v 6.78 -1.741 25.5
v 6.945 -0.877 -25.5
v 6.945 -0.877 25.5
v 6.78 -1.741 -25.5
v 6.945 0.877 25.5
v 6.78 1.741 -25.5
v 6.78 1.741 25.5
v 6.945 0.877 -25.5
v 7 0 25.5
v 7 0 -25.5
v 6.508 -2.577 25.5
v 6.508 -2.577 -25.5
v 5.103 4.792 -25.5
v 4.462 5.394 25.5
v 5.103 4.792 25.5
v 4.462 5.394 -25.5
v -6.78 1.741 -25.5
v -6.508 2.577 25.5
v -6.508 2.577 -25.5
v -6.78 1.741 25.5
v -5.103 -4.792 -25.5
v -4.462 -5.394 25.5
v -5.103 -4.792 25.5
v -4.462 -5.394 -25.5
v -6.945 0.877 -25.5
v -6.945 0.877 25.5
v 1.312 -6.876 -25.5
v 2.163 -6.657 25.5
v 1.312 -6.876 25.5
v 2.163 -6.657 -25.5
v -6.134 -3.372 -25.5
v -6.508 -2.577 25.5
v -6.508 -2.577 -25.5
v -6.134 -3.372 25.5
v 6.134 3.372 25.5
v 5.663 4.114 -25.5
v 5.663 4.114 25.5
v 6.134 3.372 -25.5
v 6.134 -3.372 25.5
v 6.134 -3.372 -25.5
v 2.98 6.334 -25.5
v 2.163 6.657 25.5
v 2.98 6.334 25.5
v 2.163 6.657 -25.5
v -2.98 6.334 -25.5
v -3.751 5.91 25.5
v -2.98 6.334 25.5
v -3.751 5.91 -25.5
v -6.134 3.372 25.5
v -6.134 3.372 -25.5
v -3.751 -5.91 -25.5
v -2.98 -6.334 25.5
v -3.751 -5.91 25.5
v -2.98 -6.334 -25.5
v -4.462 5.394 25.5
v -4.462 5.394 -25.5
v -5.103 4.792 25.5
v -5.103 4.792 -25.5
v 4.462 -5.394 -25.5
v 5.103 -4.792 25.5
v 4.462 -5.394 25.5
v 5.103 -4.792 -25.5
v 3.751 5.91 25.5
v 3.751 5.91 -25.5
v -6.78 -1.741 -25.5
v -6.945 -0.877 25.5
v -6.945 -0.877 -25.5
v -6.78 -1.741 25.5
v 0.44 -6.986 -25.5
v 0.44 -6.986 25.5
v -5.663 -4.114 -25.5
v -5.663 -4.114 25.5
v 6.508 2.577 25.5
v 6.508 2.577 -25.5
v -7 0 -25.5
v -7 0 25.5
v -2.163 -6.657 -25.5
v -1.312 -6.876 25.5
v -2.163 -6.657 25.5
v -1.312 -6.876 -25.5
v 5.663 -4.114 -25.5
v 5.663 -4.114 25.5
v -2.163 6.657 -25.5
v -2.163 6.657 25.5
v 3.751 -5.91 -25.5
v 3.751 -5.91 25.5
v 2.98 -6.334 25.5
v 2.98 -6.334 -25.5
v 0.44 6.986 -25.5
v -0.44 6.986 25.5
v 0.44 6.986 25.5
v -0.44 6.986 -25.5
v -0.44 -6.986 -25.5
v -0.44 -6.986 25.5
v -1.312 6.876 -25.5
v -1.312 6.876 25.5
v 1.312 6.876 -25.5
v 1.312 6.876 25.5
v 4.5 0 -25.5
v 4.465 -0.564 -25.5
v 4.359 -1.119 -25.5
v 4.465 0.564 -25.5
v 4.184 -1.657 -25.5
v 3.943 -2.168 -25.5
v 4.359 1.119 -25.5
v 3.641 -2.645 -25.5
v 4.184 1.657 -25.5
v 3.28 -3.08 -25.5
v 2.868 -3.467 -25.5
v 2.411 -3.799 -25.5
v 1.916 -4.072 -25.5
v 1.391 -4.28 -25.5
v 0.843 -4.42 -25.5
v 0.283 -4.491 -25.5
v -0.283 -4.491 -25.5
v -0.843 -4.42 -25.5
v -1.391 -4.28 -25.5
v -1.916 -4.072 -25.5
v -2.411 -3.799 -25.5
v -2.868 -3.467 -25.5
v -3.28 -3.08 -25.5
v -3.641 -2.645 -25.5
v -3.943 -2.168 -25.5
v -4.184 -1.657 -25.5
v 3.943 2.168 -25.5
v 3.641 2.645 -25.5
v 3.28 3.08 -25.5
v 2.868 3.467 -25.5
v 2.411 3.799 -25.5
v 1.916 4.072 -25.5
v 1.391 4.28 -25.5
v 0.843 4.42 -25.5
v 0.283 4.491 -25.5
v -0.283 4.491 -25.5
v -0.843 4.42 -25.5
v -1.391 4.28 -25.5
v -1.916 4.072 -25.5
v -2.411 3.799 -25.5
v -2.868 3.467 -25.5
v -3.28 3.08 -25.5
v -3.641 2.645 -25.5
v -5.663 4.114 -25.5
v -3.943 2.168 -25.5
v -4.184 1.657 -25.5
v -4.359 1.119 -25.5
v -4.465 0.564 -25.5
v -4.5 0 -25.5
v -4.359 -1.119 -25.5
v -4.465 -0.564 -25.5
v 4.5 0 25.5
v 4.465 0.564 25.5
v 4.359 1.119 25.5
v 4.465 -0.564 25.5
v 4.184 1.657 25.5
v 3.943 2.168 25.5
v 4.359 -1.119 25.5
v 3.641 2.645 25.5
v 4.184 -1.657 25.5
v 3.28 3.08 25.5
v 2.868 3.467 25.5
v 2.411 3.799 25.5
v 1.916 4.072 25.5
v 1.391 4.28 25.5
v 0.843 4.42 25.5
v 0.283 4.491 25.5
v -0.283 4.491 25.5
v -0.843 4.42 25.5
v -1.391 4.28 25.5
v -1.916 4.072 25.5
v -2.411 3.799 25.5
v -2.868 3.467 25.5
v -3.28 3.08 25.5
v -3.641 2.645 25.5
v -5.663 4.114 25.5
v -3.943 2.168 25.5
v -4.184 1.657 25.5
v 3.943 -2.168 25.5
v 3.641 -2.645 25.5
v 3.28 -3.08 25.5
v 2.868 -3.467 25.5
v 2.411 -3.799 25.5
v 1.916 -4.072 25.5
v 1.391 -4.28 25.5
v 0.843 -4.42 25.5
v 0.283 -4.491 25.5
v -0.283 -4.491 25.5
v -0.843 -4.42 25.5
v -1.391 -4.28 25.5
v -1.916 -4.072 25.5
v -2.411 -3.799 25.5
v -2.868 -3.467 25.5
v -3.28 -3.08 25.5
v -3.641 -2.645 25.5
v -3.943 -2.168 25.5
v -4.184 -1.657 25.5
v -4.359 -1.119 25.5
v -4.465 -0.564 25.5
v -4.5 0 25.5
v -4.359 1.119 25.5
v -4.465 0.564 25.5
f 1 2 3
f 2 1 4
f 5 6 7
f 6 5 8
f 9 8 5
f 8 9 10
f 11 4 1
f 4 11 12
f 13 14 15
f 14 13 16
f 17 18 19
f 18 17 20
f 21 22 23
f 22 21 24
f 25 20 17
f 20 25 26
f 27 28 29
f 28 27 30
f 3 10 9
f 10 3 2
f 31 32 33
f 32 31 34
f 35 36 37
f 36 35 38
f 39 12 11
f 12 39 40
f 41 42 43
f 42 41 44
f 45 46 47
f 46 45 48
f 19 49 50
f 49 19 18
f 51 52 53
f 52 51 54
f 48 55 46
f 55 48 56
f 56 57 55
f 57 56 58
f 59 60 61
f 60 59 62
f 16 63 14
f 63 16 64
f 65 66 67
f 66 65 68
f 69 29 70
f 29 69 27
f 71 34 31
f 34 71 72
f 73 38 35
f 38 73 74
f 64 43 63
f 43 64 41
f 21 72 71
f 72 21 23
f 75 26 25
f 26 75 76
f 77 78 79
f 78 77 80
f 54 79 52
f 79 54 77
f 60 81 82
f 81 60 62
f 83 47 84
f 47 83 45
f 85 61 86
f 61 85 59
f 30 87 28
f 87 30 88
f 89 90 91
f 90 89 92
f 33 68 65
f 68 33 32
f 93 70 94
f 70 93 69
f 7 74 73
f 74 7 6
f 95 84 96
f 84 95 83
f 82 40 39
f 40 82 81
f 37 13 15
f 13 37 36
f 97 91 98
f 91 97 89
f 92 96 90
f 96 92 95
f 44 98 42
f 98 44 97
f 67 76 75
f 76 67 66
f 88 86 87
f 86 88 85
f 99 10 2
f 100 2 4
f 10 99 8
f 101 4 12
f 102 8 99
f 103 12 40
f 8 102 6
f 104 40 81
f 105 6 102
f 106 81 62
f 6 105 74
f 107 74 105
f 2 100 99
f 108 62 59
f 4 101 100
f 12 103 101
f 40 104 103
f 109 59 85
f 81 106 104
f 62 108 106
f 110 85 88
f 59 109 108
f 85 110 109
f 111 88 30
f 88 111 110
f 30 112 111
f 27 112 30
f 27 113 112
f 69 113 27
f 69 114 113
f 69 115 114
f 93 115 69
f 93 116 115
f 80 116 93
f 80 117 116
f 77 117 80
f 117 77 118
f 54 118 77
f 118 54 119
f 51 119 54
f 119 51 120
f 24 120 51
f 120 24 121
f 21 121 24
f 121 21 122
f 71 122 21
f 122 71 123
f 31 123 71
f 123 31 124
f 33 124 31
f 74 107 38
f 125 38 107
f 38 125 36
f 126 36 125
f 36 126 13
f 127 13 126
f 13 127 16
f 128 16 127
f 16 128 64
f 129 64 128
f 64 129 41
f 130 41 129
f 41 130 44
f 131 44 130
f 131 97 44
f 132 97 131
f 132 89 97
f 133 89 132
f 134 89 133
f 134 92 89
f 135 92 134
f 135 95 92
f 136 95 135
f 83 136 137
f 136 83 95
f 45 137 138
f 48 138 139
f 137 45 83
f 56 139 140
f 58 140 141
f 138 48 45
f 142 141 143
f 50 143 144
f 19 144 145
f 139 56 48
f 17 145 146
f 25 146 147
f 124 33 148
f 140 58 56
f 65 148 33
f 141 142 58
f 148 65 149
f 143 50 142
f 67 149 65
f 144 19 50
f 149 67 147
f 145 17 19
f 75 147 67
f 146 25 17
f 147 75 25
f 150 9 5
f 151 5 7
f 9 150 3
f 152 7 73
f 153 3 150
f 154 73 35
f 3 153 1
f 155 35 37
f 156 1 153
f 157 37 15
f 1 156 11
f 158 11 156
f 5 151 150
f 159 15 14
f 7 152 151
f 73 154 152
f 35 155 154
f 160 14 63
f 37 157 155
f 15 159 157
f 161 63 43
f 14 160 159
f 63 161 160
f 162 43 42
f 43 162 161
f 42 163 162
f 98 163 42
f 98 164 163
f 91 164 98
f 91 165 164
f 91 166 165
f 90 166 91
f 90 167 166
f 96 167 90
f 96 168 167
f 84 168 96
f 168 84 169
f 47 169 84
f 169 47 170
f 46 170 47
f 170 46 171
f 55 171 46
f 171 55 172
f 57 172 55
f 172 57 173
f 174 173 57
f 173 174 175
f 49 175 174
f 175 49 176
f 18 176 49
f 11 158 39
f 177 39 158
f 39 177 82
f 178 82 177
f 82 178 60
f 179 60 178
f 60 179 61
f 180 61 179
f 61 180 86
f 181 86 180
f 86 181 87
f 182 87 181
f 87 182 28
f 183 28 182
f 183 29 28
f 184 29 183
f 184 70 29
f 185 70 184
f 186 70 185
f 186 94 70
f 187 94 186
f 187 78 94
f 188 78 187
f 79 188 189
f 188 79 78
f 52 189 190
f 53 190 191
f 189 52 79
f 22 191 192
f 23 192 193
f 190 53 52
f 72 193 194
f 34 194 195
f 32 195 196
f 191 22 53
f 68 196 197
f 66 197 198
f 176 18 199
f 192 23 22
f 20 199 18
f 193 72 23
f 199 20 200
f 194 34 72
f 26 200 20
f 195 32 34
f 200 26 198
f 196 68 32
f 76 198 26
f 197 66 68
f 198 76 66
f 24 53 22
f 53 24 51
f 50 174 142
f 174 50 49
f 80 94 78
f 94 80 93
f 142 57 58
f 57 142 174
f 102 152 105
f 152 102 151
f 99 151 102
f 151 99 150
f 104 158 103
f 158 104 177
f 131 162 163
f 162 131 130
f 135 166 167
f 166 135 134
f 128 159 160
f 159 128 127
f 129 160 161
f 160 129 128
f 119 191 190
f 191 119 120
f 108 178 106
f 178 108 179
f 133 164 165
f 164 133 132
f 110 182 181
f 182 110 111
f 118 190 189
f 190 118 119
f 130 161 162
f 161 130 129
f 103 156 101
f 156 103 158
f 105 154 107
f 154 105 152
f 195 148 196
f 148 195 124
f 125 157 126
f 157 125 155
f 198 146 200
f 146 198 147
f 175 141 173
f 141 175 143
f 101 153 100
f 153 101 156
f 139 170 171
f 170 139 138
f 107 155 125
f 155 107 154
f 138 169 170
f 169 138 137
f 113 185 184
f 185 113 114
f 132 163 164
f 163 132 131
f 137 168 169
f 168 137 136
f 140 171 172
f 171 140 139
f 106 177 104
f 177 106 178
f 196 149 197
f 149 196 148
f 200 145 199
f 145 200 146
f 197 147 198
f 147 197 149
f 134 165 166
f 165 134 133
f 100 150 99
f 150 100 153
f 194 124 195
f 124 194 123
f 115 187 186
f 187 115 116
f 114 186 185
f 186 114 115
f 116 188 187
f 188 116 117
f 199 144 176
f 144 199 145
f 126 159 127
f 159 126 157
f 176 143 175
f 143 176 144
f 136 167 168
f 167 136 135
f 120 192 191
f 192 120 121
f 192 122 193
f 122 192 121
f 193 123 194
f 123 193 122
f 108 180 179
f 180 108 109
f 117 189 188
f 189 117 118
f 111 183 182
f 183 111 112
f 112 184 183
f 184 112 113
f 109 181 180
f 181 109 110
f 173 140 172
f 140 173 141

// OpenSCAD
$fn = 50;


difference() {
	union() {
		translate(v = [0, 0, -25.5000000000]) {
			cylinder(h = 51, r = 7.0000000000);
		}
	}
	union() {
		translate(v = [0, 0, -100.0000000000]) {
			cylinder(h = 200, r = 4.5000000000);
		}
	}
}
